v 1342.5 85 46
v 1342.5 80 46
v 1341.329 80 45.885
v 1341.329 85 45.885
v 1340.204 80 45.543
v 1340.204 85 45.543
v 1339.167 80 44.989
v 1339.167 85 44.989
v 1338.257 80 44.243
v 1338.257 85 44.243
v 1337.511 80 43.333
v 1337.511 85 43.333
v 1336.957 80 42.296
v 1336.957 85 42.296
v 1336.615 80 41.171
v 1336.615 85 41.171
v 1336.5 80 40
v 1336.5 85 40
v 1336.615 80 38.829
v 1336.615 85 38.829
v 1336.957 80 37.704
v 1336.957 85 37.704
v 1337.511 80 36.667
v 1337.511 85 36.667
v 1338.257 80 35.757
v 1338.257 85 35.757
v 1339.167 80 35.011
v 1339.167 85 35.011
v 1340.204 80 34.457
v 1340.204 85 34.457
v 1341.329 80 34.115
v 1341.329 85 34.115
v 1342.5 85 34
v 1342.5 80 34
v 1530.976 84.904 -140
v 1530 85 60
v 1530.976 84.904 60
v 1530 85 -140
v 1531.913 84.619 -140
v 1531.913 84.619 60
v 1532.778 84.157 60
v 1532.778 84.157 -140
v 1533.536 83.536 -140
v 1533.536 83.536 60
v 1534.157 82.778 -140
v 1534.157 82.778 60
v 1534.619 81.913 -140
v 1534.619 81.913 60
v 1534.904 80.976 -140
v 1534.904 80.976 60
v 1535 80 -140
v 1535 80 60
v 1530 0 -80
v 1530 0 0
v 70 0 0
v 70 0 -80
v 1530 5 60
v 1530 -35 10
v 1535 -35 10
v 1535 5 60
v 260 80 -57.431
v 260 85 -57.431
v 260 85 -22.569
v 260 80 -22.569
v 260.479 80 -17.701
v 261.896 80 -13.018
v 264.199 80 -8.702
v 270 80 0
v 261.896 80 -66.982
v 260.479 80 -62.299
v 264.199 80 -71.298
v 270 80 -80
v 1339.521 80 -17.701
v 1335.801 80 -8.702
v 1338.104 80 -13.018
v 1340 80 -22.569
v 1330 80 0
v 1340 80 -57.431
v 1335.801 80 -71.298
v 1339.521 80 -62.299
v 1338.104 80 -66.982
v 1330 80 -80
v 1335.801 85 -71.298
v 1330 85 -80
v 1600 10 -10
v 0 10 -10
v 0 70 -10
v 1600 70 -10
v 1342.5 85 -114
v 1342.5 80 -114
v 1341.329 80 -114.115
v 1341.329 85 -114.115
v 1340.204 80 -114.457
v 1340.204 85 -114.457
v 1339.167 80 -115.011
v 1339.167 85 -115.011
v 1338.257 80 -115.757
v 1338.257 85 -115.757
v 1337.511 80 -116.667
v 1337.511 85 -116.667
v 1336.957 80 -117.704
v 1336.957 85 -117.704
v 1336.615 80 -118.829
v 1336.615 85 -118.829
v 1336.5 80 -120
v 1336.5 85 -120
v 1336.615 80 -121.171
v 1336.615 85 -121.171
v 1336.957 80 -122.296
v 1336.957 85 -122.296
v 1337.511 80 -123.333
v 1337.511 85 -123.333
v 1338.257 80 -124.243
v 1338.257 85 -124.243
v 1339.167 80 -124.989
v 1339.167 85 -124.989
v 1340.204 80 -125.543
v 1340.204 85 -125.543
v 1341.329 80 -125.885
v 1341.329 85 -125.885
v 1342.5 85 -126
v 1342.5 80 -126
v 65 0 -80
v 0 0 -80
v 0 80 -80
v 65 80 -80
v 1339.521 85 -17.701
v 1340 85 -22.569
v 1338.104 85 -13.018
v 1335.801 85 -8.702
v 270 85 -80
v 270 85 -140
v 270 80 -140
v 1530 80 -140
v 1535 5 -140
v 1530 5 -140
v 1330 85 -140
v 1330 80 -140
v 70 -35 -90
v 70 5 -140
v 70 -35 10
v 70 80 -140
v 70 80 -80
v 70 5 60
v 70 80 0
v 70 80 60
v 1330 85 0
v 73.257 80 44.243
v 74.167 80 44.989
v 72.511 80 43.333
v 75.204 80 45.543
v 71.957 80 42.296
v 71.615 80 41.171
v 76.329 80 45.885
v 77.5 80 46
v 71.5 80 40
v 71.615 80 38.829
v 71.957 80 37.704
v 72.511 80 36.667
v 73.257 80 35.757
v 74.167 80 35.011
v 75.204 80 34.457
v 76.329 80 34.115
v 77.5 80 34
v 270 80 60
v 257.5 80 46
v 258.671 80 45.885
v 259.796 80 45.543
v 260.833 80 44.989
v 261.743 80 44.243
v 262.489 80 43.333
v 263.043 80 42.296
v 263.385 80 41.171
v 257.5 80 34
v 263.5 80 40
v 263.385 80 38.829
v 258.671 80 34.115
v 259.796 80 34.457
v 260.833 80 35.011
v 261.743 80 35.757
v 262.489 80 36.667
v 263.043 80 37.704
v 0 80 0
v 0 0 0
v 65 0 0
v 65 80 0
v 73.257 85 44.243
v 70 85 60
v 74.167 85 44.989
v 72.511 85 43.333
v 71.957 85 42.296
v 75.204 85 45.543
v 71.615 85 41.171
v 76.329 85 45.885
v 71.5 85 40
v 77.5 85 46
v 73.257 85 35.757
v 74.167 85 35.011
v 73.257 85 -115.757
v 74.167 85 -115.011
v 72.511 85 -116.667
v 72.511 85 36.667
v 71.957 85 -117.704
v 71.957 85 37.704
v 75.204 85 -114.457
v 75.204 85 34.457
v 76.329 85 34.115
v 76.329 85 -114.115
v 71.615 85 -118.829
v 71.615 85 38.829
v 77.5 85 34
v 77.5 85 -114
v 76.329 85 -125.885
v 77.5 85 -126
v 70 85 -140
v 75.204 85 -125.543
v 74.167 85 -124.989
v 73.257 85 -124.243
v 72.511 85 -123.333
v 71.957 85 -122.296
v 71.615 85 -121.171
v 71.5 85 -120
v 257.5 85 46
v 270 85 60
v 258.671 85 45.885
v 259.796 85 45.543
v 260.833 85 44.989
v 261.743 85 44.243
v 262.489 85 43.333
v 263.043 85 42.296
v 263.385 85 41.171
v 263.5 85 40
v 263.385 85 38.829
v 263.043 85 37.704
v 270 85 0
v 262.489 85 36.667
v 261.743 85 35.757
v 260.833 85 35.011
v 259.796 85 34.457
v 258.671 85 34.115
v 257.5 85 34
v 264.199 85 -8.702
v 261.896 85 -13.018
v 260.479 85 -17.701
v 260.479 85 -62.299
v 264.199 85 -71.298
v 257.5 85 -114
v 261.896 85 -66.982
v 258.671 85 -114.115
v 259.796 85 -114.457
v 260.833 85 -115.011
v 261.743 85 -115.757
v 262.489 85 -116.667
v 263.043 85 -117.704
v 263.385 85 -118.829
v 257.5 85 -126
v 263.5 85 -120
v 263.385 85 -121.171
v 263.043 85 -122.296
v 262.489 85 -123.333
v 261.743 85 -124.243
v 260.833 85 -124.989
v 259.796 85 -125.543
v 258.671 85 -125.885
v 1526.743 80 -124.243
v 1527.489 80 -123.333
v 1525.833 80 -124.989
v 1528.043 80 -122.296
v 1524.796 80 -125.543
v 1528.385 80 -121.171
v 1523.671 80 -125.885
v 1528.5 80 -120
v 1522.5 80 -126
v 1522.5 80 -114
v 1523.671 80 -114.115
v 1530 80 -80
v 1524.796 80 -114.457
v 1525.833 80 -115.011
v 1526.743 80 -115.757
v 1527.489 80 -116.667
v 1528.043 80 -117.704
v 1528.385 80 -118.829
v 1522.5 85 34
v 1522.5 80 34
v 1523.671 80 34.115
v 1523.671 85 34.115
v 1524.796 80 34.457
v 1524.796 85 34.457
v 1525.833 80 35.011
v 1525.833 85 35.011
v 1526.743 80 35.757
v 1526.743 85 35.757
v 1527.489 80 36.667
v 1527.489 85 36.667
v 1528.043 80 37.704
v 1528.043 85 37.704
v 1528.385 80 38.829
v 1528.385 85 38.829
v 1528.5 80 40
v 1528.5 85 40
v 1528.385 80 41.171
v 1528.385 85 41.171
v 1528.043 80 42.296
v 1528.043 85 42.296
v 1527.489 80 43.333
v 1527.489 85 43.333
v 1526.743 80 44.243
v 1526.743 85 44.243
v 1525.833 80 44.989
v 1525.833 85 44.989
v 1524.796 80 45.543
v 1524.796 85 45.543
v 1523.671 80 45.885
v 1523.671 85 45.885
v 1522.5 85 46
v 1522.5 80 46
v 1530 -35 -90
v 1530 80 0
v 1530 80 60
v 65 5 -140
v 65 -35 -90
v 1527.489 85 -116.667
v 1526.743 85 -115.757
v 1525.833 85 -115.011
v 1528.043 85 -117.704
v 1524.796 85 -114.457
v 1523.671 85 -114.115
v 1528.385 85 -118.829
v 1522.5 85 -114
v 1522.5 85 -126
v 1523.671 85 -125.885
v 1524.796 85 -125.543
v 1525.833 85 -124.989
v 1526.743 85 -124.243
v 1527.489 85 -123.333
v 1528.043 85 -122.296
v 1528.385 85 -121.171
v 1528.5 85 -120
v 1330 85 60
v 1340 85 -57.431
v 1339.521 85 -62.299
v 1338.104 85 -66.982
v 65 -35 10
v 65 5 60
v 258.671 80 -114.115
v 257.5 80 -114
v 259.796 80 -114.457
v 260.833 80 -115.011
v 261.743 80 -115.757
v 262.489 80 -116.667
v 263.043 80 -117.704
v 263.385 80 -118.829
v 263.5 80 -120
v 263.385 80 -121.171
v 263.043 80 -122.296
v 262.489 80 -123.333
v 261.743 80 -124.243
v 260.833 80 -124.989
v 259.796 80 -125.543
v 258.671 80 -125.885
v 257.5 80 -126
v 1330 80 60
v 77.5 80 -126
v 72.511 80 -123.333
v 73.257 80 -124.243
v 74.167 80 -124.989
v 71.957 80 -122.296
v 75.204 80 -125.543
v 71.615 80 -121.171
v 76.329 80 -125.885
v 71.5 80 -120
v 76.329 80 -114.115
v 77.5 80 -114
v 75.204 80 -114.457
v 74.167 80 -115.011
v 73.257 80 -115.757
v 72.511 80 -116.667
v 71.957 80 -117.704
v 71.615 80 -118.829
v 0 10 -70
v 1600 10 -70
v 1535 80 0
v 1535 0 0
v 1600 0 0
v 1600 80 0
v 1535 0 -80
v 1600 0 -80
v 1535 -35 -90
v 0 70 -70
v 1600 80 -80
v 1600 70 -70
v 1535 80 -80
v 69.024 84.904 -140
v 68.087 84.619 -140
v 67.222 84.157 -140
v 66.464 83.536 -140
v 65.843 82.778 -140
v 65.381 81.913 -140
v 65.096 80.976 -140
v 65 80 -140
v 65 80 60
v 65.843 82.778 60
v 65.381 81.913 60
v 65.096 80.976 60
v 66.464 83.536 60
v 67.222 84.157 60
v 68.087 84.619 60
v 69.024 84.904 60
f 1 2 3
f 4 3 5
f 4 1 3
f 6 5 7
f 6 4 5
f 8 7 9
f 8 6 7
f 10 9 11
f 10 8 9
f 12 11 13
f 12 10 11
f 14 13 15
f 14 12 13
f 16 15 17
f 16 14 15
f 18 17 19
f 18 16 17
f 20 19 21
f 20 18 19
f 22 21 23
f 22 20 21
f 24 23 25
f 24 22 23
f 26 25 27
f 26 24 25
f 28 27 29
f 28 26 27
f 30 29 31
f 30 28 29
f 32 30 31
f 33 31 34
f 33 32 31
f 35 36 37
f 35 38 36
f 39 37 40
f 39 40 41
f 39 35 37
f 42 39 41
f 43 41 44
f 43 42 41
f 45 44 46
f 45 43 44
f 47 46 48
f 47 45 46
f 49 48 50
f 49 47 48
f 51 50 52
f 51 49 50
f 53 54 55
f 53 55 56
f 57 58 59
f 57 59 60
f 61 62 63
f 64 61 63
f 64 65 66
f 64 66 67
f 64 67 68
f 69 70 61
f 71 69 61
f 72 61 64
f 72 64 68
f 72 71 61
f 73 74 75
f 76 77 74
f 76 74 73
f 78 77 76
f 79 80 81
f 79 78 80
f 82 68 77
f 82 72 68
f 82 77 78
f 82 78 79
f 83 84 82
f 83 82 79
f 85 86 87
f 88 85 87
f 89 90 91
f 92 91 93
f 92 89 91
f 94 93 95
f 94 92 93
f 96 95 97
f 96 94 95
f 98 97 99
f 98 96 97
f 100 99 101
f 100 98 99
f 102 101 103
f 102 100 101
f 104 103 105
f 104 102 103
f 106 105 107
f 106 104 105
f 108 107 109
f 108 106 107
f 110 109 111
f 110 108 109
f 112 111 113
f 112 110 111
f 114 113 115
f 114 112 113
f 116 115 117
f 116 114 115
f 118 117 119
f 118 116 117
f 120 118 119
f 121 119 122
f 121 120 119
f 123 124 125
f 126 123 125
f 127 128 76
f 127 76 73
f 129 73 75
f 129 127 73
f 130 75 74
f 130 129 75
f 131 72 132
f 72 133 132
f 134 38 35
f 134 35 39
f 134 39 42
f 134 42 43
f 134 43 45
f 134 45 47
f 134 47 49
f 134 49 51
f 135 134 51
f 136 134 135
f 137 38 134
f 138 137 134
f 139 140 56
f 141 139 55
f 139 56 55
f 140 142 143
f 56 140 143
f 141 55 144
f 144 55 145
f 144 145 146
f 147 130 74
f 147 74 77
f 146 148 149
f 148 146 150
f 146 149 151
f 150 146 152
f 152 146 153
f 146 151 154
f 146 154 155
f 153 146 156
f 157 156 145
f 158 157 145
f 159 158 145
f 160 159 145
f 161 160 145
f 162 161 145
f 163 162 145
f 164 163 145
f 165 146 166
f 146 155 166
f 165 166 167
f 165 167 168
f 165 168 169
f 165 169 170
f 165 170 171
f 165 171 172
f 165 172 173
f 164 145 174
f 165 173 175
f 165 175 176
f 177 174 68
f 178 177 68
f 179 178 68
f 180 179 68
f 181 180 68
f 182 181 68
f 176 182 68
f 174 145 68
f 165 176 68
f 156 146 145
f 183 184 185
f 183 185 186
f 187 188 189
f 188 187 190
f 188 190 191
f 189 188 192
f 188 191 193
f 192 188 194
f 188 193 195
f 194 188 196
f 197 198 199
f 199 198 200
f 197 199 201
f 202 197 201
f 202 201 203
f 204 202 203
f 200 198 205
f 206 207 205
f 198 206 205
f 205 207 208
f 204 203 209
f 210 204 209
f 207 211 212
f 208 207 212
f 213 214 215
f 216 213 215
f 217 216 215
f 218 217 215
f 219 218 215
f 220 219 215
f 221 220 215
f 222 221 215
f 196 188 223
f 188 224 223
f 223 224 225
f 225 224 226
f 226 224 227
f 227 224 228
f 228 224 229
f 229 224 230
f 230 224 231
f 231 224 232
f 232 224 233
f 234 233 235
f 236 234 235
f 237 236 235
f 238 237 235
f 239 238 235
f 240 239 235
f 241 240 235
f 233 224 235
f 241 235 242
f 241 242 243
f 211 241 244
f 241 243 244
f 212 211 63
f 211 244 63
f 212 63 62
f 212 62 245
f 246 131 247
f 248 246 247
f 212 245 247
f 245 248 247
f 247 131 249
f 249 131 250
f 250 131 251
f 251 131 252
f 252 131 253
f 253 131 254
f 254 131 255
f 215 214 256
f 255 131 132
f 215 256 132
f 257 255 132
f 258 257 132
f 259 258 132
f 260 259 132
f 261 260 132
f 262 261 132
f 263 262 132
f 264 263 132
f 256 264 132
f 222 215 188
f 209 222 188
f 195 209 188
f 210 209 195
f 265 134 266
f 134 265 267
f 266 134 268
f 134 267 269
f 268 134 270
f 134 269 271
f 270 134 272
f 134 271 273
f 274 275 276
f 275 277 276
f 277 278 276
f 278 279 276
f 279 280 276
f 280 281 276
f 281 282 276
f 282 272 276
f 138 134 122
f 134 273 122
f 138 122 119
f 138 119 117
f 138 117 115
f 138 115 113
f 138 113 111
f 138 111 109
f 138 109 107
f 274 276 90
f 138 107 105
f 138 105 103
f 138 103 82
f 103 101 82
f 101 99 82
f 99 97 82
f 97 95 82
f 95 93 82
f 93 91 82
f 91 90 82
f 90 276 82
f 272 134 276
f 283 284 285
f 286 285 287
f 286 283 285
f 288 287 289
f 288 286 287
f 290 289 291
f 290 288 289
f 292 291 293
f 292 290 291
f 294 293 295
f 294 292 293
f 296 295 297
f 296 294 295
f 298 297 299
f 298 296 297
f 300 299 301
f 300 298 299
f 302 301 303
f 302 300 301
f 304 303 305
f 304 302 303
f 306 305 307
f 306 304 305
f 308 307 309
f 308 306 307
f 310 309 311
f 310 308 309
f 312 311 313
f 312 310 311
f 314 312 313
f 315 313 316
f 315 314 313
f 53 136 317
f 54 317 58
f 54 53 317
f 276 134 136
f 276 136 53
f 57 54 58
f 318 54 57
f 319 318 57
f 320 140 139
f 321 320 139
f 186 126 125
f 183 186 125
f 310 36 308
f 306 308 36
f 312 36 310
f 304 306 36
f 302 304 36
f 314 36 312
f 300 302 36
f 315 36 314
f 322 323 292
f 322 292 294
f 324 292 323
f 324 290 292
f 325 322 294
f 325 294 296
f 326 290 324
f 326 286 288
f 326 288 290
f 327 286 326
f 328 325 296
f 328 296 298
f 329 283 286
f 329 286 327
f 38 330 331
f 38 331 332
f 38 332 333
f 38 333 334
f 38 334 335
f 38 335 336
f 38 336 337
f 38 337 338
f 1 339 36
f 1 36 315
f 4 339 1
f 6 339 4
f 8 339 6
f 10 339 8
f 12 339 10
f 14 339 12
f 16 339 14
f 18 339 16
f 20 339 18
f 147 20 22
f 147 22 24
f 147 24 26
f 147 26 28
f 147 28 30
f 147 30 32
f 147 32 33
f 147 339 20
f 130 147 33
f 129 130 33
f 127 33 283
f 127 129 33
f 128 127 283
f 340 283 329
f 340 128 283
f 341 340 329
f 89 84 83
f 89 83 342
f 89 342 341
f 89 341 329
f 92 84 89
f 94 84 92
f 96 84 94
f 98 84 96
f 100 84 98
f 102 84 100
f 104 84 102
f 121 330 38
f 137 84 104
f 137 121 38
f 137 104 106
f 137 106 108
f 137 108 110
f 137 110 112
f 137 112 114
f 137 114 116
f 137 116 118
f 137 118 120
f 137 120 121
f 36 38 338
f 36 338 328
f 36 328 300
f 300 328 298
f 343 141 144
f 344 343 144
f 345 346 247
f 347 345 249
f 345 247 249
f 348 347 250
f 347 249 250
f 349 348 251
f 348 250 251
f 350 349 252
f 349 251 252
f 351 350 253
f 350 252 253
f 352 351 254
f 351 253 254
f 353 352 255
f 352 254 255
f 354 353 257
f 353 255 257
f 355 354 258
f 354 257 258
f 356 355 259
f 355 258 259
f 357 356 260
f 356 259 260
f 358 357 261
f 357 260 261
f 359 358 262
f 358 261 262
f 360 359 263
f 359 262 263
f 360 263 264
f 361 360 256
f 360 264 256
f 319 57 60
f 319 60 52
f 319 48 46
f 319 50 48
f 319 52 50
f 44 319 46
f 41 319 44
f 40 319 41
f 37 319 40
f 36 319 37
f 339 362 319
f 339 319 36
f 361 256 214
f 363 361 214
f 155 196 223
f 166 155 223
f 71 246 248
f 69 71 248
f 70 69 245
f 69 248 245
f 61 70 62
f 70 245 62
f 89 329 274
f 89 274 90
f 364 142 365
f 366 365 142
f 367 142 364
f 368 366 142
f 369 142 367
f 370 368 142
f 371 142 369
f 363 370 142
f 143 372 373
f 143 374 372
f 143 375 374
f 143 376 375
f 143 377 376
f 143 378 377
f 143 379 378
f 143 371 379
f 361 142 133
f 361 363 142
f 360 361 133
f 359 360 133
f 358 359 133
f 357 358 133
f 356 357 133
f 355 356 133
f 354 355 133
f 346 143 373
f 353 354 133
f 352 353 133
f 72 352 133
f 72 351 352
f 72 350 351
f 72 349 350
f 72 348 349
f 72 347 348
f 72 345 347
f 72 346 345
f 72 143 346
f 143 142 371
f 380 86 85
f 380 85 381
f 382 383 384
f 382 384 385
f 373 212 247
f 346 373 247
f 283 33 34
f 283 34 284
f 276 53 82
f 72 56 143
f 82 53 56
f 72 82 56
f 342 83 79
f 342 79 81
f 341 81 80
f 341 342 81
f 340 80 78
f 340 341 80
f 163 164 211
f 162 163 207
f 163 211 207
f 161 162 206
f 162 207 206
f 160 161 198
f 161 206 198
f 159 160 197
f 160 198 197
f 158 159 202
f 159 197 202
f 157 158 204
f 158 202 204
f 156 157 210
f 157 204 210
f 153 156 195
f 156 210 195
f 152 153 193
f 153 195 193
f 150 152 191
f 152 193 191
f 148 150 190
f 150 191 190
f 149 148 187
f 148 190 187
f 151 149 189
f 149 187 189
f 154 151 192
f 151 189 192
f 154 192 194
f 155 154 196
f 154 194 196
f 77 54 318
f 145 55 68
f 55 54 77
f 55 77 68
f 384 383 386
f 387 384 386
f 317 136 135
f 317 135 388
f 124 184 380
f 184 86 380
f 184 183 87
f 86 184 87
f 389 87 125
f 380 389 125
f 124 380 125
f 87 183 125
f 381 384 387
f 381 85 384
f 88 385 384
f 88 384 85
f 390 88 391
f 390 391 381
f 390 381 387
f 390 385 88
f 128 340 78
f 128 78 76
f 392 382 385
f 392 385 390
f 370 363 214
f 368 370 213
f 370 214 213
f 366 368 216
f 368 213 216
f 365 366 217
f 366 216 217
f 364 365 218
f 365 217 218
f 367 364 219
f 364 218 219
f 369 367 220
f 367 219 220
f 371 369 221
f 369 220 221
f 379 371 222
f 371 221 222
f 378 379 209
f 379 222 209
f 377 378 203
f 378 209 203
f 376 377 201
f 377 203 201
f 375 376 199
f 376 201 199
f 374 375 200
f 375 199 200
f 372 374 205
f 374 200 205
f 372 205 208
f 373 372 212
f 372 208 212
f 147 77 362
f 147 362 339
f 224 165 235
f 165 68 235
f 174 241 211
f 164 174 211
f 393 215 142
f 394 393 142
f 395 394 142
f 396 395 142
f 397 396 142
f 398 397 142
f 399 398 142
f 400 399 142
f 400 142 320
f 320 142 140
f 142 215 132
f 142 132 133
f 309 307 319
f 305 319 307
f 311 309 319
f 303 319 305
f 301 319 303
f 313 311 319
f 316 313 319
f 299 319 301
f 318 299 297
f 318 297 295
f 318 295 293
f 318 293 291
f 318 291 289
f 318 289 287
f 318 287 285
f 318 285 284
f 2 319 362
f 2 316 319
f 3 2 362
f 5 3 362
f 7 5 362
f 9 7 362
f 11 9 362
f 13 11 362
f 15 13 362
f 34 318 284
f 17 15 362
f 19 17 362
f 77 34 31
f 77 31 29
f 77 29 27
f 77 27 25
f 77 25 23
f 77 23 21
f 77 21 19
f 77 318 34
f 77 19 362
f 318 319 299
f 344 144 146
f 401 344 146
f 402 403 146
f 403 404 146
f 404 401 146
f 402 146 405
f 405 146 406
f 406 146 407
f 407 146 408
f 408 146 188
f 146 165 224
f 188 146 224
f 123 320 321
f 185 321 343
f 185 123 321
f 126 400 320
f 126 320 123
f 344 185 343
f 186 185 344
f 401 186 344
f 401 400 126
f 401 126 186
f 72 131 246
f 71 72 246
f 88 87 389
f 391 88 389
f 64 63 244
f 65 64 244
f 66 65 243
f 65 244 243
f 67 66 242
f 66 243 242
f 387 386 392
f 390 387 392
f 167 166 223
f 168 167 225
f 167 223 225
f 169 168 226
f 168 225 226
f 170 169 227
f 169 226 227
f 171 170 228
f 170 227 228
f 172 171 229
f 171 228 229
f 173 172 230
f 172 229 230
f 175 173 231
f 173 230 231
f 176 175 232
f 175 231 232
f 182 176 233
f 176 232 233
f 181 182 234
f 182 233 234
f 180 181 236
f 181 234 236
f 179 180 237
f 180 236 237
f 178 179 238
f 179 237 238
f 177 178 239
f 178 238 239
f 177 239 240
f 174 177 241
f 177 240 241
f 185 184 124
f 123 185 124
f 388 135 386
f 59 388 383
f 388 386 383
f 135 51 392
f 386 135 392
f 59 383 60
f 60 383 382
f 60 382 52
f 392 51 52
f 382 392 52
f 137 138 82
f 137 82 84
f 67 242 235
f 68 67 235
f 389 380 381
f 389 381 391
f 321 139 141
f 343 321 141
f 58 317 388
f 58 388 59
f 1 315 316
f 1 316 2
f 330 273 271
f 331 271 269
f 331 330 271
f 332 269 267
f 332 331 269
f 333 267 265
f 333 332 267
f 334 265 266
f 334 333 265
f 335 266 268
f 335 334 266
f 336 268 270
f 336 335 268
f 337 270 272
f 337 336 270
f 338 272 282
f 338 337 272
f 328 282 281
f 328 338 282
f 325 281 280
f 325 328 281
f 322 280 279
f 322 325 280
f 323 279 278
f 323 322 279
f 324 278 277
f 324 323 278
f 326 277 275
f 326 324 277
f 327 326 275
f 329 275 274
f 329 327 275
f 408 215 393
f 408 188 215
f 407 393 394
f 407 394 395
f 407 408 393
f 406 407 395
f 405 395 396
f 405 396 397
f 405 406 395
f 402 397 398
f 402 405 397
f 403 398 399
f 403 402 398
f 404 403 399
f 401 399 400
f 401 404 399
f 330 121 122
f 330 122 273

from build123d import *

# Parameters (mm, degrees)
SKETCH3_W                       = 80
SKETCH3_H                       = 80
SKETCH3_W_2                     = 60
SKETCH3_H_2                     = 60
BOSS_EXTRUDE2_DEPTH             = 1600
SKETCH7_W                       = 60
SKETCH7_H                       = 60
BOSS_EXTRUDE3_DEPTH             = 5
BOSS_EXTRUDE4_REACH             = 1610.361
SKETCH8_W                       = 205
SKETCH8_H                       = 5
BOSS_EXTRUDE4_DIRECTION_2_REACH = 1610.361
CUT_EXTRUDE1_DEPTH              = 5
CUT_EXTRUDE2_REACH              = 1612.59
FILLET1_R                       = 5
FILLET1_OF_MIRROR1_R            = 5
FILLET1_OF_MIRROR2_R            = 5


with BuildPart() as part:
    # Sketch3 → Boss-Extrude2 (new body)
    with BuildSketch(Plane(origin=(0, 0, 0), x_dir=(0, 0, -1), z_dir=(1, 0, 0))):
        with Locations((40, 40)):
            Rectangle(SKETCH3_W, SKETCH3_H)
        with Locations((40, 40)):
            Rectangle(SKETCH3_W_2, SKETCH3_H_2, mode=Mode.SUBTRACT)
    extrude(amount=BOSS_EXTRUDE2_DEPTH)

    # Sketch7 → Boss-Extrude3 (add)
    with BuildSketch(Plane(origin=(1530, 0, 0), x_dir=(0, 0, -1), z_dir=(1, 0, 0))):
        Polygon((-60, 85), (140, 85), (140, 5), (90, -35), (-10, -35), (-60, 5), align=None)
        with Locations((40, 40)):
            Rectangle(SKETCH7_W, SKETCH7_H, mode=Mode.SUBTRACT)
    boss_extrude3 = extrude(amount=BOSS_EXTRUDE3_DEPTH)

    # Boss-Extrude4: up to this face of the body (flat: up to its plane)
    boss_extrude4_end = Plane(part.part.faces().sort_by_distance((1532.5, 45, -140))[0])
    # Sketch8 → Boss-Extrude4 (add, up to the picked face)
    with BuildSketch(Plane(origin=(0, 0, -80), x_dir=(-1, 0, 0), z_dir=(0, 0, -1)), mode=Mode.PRIVATE) as boss_extrude4_sk1:
        with Locations((-1432.5, 82.5)):
            Rectangle(SKETCH8_W, SKETCH8_H)
    boss_extrude4_tool1 = split(extrude(boss_extrude4_sk1.sketch, amount=BOSS_EXTRUDE4_REACH, mode=Mode.PRIVATE), bisect_by=boss_extrude4_end, keep=Keep.BOTH, mode=Mode.PRIVATE)
    boss_extrude4 = boss_extrude4_tool1.solids().sort_by(Axis((1432.5, 82.5, -80), (0, 0, -1)))[0]
    add(boss_extrude4)

    # Boss-Extrude4 direction 2: up to this face of the body (flat: up to its plane)
    boss_extrude4_direction_2_end = Plane(part.part.faces().sort_by_distance((1532.5, 45, 60))[0])
    # Sketch8 → Boss-Extrude4 direction 2 (add, up to the picked face)
    with BuildSketch(Plane(origin=(0, 0, -80), x_dir=(-1, 0, 0), z_dir=(0, 0, -1)), mode=Mode.PRIVATE) as boss_extrude4_direction_2_sk1:
        with Locations((-1432.5, 82.5)):
            Rectangle(SKETCH8_W, SKETCH8_H)
    boss_extrude4_direction_2_tool1 = split(extrude(boss_extrude4_direction_2_sk1.sketch, amount=-BOSS_EXTRUDE4_DIRECTION_2_REACH, mode=Mode.PRIVATE), bisect_by=boss_extrude4_direction_2_end, keep=Keep.BOTH, mode=Mode.PRIVATE)
    boss_extrude4_direction_2 = boss_extrude4_direction_2_tool1.solids().sort_by(Axis((1432.5, 82.5, -80), (0, 0, 1)))[0]
    add(boss_extrude4_direction_2)

    # Sketch9 → Cut-Extrude1 (cut)
    with BuildSketch(Plane(origin=(0, 85, 0), x_dir=(1, 0, 0), z_dir=(0, 1, 0))):
        with BuildLine():
            Line((1330, 80), (1335.801257358, 71.298113962))
            ThreePointArc((1335.801257358, 71.298113962), (1338.927300662, 64.675212774), (1340, 57.430609057))
            Line((1340, 57.430609057), (1340, 22.569390943))
            ThreePointArc((1340, 22.569390943), (1338.927300662, 15.324787226), (1335.801257358, 8.701886038))
            Line((1335.801257358, 8.701886038), (1330, 0))
            Line((1330, 0), (1330, 80))
        make_face()
    cut_extrude1 = extrude(amount=-CUT_EXTRUDE1_DEPTH, mode=Mode.SUBTRACT)

    # Sketch10 → Cut-Extrude2 (cut, up to next)
    with BuildSketch(Plane(origin=(0, 85, 0), x_dir=(1, 0, 0), z_dir=(0, 1, 0)), mode=Mode.PRIVATE) as cut_extrude2_sk1:
        with BuildLine():
            Line((1342.5, 126), (1522.5, 126))
            ThreePointArc((1522.5, 126), (1528.5, 120), (1522.5, 114))
            Line((1522.5, 114), (1342.5, 114))
            ThreePointArc((1342.5, 114), (1336.5, 120), (1342.5, 126))
        make_face()
    cut_extrude2_tool1 = extrude(cut_extrude2_sk1.sketch, amount=-CUT_EXTRUDE2_REACH, mode=Mode.PRIVATE) & part.part
    # Sketch10 → Cut-Extrude2 (cut, up to next)
    with BuildSketch(Plane(origin=(0, 85, 0), x_dir=(1, 0, 0), z_dir=(0, 1, 0)), mode=Mode.PRIVATE) as cut_extrude2_sk2:
        with BuildLine():
            Line((1342.5, -34), (1522.5, -34))
            ThreePointArc((1522.5, -34), (1528.5, -40), (1522.5, -46))
            Line((1522.5, -46), (1342.5, -46))
            ThreePointArc((1342.5, -46), (1336.5, -40), (1342.5, -34))
        make_face()
    cut_extrude2_tool2 = extrude(cut_extrude2_sk2.sketch, amount=-CUT_EXTRUDE2_REACH, mode=Mode.PRIVATE) & part.part
    cut_extrude2_1 = cut_extrude2_tool1.solids().sort_by_distance((1432.5, 85, -120))[0]
    add(cut_extrude2_1, mode=Mode.SUBTRACT)
    cut_extrude2_2 = cut_extrude2_tool2.solids().sort_by_distance((1432.5, 85, 40))[0]
    add(cut_extrude2_2, mode=Mode.SUBTRACT)
    cut_extrude2 = cut_extrude2_1 + cut_extrude2_2  # Cut-Extrude2 as one shape, for the pattern or mirror that repeats it

    # Fillet1
    fillet1_edges = [part.edges().sort_by_distance(p)[0] for p in [
        (1535, 85, -40),
    ]]
    fillet(fillet1_edges, radius=FILLET1_R - 0.0001)  # a hair under: the kernel refuses the full size

    # Mirror1: Boss-Extrude3 across plane
    add(boss_extrude3.mirror(Plane(origin=(800, 0, 0), x_dir=(0, 0, 1), z_dir=(1, 0, 0))))

    # Fillet1 of Mirror1
    fillet1_of_mirror1_edges = [part.edges().sort_by_distance(p)[0] for p in [
        (65, 85, -40),
    ]]
    fillet(fillet1_of_mirror1_edges, radius=FILLET1_OF_MIRROR1_R - 0.0001)  # a hair under: the kernel refuses the full size

    # Mirror2: Boss-Extrude3, Boss-Extrude4, Boss-Extrude4 direction 2, Cut-Extrude1, Cut-Extrude2 across plane
    add(boss_extrude3.mirror(Plane(origin=(800, 0, 0), x_dir=(0, 0, 1), z_dir=(1, 0, 0))))
    add(boss_extrude4.mirror(Plane(origin=(800, 0, 0), x_dir=(0, 0, 1), z_dir=(1, 0, 0))))
    add(boss_extrude4_direction_2.mirror(Plane(origin=(800, 0, 0), x_dir=(0, 0, 1), z_dir=(1, 0, 0))))
    add(cut_extrude1.mirror(Plane(origin=(800, 0, 0), x_dir=(0, 0, 1), z_dir=(1, 0, 0))), mode=Mode.SUBTRACT)
    add(cut_extrude2.mirror(Plane(origin=(800, 0, 0), x_dir=(0, 0, 1), z_dir=(1, 0, 0))), mode=Mode.SUBTRACT)

    # Fillet1 of Mirror2
    fillet1_of_mirror2_edges = [part.edges().sort_by_distance(p)[0] for p in [
        (65, 85, -40),
    ]]
    fillet(fillet1_of_mirror2_edges, radius=FILLET1_OF_MIRROR2_R - 0.0001)  # a hair under: the kernel refuses the full size


solid = part.part
